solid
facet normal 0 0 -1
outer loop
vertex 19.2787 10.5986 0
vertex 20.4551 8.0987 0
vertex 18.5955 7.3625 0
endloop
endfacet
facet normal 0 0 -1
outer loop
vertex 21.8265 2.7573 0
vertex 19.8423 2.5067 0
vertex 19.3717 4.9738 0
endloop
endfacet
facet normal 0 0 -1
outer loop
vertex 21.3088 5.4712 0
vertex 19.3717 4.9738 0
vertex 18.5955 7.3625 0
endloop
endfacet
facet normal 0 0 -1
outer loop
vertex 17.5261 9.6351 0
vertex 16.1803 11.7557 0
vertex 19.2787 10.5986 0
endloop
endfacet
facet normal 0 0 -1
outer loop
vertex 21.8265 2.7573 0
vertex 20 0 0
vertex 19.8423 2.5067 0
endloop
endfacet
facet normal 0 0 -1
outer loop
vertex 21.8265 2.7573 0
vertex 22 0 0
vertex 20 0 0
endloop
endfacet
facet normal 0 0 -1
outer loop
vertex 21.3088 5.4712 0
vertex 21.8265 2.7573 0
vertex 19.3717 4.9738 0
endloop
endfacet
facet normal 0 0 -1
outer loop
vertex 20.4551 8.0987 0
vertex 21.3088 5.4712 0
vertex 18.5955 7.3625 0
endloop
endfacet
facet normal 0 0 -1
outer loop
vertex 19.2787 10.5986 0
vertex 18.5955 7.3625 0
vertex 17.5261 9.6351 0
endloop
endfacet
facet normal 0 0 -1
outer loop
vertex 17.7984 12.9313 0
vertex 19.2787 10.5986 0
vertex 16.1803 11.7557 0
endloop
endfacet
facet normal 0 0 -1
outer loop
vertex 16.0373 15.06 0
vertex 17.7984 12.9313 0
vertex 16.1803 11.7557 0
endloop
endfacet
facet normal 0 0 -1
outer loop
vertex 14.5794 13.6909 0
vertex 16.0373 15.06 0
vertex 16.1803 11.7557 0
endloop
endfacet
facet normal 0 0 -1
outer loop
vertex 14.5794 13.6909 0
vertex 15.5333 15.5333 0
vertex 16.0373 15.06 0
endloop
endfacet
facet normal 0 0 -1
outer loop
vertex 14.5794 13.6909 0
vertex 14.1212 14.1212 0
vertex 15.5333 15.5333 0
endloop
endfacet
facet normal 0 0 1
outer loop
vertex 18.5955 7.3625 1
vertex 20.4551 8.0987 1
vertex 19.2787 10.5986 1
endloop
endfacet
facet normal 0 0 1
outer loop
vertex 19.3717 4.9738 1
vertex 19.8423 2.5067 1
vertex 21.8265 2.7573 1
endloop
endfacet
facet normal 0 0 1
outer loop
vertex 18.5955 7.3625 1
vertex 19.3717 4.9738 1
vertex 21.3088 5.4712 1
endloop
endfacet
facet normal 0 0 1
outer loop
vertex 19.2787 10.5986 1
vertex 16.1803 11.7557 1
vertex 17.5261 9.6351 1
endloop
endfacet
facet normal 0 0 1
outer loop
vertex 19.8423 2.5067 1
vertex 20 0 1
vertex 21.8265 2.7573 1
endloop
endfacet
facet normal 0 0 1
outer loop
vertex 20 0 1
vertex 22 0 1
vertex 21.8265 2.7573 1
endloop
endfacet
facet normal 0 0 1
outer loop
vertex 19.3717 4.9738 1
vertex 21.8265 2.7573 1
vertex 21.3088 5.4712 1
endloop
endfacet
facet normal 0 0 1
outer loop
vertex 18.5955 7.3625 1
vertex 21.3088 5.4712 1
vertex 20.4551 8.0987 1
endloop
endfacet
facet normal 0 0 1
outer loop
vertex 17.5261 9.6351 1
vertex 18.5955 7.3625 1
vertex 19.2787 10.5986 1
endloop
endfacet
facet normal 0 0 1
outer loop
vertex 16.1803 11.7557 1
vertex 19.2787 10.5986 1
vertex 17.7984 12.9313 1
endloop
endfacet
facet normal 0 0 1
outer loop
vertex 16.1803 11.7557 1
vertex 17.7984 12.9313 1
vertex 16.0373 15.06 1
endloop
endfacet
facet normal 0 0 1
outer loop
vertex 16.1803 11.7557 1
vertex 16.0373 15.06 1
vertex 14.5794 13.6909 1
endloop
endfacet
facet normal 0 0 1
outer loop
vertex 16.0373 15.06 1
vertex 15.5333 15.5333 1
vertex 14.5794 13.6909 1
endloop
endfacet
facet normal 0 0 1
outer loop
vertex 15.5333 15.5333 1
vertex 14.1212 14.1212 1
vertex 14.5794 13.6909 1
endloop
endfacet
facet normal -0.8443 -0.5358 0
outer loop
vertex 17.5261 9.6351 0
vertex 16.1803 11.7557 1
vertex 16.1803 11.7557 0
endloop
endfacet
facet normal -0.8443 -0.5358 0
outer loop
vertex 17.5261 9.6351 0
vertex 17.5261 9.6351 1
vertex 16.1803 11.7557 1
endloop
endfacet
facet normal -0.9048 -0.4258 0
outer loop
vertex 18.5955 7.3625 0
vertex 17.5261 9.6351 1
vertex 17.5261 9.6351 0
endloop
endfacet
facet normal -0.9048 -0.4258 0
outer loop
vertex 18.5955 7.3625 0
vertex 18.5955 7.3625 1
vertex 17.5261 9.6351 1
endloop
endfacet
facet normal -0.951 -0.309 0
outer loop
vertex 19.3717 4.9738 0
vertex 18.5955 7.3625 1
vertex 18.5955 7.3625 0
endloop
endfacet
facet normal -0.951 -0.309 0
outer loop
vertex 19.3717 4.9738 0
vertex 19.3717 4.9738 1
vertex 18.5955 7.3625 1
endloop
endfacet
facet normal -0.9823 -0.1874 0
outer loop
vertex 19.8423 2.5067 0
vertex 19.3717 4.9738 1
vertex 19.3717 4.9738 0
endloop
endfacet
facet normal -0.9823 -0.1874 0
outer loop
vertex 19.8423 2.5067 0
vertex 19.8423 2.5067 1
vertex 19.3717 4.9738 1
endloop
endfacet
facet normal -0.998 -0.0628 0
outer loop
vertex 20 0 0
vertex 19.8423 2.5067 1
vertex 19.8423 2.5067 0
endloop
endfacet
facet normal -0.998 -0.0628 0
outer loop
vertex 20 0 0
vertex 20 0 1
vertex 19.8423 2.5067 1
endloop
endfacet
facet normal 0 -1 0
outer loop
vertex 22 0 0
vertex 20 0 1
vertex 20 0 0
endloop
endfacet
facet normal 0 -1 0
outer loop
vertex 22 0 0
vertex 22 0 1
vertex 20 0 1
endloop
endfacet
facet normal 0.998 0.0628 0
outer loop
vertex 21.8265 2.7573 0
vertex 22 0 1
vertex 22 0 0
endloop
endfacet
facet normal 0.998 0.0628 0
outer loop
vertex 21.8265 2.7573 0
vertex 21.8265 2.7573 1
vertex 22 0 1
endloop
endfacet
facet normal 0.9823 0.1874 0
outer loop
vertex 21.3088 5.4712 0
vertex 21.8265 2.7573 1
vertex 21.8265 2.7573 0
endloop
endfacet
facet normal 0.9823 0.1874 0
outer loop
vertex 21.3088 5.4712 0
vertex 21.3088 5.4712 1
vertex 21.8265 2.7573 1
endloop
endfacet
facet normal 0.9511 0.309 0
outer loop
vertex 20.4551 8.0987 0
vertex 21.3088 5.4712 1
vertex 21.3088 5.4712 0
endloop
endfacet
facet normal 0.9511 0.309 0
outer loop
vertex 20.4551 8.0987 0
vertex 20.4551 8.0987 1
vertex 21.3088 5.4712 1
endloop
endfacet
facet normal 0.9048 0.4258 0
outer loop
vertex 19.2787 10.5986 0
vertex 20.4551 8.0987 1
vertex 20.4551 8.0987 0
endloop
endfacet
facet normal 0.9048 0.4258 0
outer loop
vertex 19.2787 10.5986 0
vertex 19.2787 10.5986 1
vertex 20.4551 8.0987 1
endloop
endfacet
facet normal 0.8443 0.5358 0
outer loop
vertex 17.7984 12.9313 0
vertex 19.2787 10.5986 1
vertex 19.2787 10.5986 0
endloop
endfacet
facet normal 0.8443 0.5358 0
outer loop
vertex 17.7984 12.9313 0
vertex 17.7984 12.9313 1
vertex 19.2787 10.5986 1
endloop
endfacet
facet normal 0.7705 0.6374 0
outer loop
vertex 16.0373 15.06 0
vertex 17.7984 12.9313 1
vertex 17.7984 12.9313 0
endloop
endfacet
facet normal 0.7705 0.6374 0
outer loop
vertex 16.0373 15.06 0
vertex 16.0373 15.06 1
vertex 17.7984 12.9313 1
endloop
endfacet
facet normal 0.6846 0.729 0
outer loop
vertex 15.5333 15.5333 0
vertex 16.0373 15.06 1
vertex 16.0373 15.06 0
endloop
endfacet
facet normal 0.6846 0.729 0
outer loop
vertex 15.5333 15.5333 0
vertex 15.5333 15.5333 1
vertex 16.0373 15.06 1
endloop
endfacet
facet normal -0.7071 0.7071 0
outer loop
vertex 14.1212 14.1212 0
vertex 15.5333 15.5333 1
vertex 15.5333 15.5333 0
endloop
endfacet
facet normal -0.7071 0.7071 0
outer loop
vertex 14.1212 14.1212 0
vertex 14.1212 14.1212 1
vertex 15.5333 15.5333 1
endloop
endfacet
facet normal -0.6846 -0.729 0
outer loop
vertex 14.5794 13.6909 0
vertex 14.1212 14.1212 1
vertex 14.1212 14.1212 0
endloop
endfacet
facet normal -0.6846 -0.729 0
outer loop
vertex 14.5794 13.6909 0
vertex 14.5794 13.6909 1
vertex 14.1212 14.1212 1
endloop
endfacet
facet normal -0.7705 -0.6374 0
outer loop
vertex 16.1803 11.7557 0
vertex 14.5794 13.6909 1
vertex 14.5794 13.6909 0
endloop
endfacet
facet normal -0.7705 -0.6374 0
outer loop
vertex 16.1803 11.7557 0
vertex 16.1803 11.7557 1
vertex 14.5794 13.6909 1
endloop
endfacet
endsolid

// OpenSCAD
// file: ../../vendor/honeycomb.scad
/**
 * Honeycomb library
 * License: Creative Commons - Attribution
 * Copyright: Gael Lafond 2017
 * URL: https://www.thingiverse.com/thing:2484395
 *
 * Inspired from:
 *   https://www.thingiverse.com/thing:1763704
 */

// a single filled hexagon
module hexagon(l)  {
	circle(d=l, $fn=6);
}

// parametric honeycomb  
module honeycomb(x, y, dia, wall)  {
	// Diagram
	//          ______     ___
	//         /     /\     |
	//        / dia /  \    | smallDia
	//       /     /    \  _|_
	//       \          /   ____ 
	//        \        /   / 
	//     ___ \______/   / 
	// wall |            /
	//     _|_  ______   \
	//         /      \   \
	//        /        \   \
	//                 |---|
	//                   projWall
	//
	smallDia = dia * cos(30);
	projWall = wall * cos(30);

	yStep = smallDia + wall;
	xStep = dia*3/2 + projWall*2;

	difference()  {
		square([x, y]);

		// Note, number of step+1 to ensure the whole surface is covered
		for (yOffset = [0:yStep:y+yStep], xOffset = [0:xStep:x+xStep]) {
			translate([xOffset, yOffset]) {
				hexagon(dia);
			}
			translate([xOffset + dia*3/4 + projWall, yOffset + (smallDia+wall)/2]) {
				hexagon(dia);
			}
		}
	}
}
// file: ../../lib/design/honeycomb.scad
include <../../vendor/honeycomb.scad>
include <../primitive/rounded_cube.scad>

$wall_thickness = 2;
$bleed = 0.01;
$hexagons_per_side = 2;

function relative_diameter(dimensions) = (
  min(
    dimensions[0],
    dimensions[1]) + $wall_thickness
  ) / $hexagons_per_side;

function honeycomb_inset_size(size, inset = $wall_thickness) = [
    size[0] - $wall_thickness,
    size[1] - inset * 2,
    size[2] + $bleed * 2,
];

module block_border(dimensions) {
  inner_dimensions = [
    dimensions[0] - $wall_thickness * 2,
    dimensions[1] - $wall_thickness * 2,
    dimensions[2] + $bleed * 2
  ];

  difference() {
    rounded_cube(dimensions, flat_top=true, flat_bottom=true);

    translate([$wall_thickness, $wall_thickness, -$bleed]) {
      rounded_cube(inner_dimensions, flat_top=true, flat_bottom=true);
    }
  }
}

module negative_honeycomb_cube(dimensions, diameter=-1) {
  honeycomb_size = [
    dimensions[0],
    dimensions[1],
    dimensions[2] + $bleed * 2,
  ];

  difference() {
    cube(dimensions);
    translate([0, 0, -$bleed]) {
      honeycomb_cube(dimensions, diameter);
    }
  }
}

module honeycomb_cube(dimensions, diameter=-1) {
  _diameter = diameter > 0
    ? diameter
    : relative_diameter(dimensions);

  linear_extrude(dimensions[2]) {
    honeycomb(dimensions[0], dimensions[1], _diameter, $wall_thickness);
  }
}

module honeycomb_spacer(dimensions) {
  honeycomb_cube(dimensions);

  block_border(dimensions);
}
// file: ../../lib/primitive/rounded_square.scad
$bleed = 1;
$rounding = 3;

module rounded_square(size, flat_top=false, flat_bottom=false) {
  assert(!(flat_top && flat_bottom), "Flat top and flat bottom are exclusive");

  rounding_height = flat_top || flat_bottom 
    ? $rounding 
    : $rounding * 2;

  offset = flat_bottom ? 0 : $rounding;

  inner_size = [
    size[0] - $rounding * 2,
    size[1] - rounding_height,
  ];

  minkowski() {
    translate([$rounding, offset]) {
      square(inner_size);
    }
    if (flat_top ) {
      difference() {
        circle($rounding);
        translate([-$rounding, 0]) {
          square([$rounding * 2, $rounding]);
        }
      }
    } else if (flat_bottom) {
      difference() {
        circle($rounding);
        translate([-$rounding, -$rounding]) {
          square([$rounding * 2, $rounding]);
        }
      }
    } else {
      circle($rounding);
    }
  }
}
// file: ../../lib/util/util_functions.scad
function sum(v) = [for(p = v) 1] * v;

function take_sum(v, i) = i == 0 
  ? 0 
  : sum([for(a=[0:i-1]) v[a]]);

// input : nested list
// output : list with the outer level nesting removed
function flatten(l) = [ for (a = l) for (b = a) b ] ;
// file: ../../lib/compound/notched_cube.scad
include <../layout/layout.scad>
include <../design/honeycomb.scad>

$wall_thickness = 2;
$bleed = 0.01;
$padding = 0.5;
$inset = 6;
$cutout_fraction = 0.6;
$cutout_lid_height = $wall_thickness;

// I have no idea why it needs to be this vaule
// Seems to be to do with how the cube handles rounding
magic_pill_number = 0.4;

// TODO review pill feature, it's been changed to include padding so
// the magic pill number might no longer be needed
function cutout_rounding (size, pill=false) = pill
  ? min(size[0], size[1]) / 2  + magic_pill_number:
  1;

function cutout_fraction_size(length) = length * $cutout_fraction;

function cutout_fraction_rect(rect) = [
  cutout_fraction_size(rect[0]),
  cutout_fraction_size(rect[1]),
];

module notched_cube(
  size,
  floor_height=$wall_thickness,
  left_cutout=false,
  right_cutout=false,
  top_cutout=false,
  bottom_cutout=false,
  honeycomb_diameter=undef,
  pill=false,
  floor_cutout=false,
  cutout_size=undef,
  bounding_box=undef,
) {
  _bounding_box = bounding_box == undef ? size : bounding_box;
  cutout_fraction = cutout_fraction_size(cutout_size == undef ? size : cutout_size);

  assert(size[2] > floor_height, "Box height shorter than floor height");
  assert(size[0] <= _bounding_box[0], "Bounding box must be greater than or equal to size");
  assert(size[1] <= _bounding_box[1], "Bounding box must be greater than or equal to size");

  honeycomb_base = honeycomb_diameter != undef;
  inset_length = $inset * 2 + $wall_thickness;
  box_offset = offset_centre_in_box(size, _bounding_box);

  cutout_size = [
    size[0],
    size[1],
    size[2] - floor_height + $bleed,
  ];

  translate(box_offset) {
    translate([0, 0, floor_height]) {
      rounded_cube(cutout_size, flat = true, $rounding = cutout_rounding(size, pill));
    }

    if (left_cutout) {
      left_cutout_size = [
        inset_length + box_offset[0],
        cutout_fraction[1],
        size[2] + $cutout_lid_height + $bleed * 2,
      ];

      translate([
        - left_cutout_size[0] + $inset,
        (size[1] - left_cutout_size[1]) / 2,
        0
      ]) {
        rounded_cube(left_cutout_size, flat = true);
      }
    }

    if (right_cutout) {
      right_cutout_size = [
        inset_length + box_offset[0],
        cutout_fraction[1],
        size[2] + $cutout_lid_height + $bleed * 2,
      ];

      translate([
        size[0] - $inset,
        (size[1] - right_cutout_size[1]) / 2,
        0
      ]) {
        rounded_cube(right_cutout_size, flat = true);
      }
    }

    if (top_cutout) {
      top_cutout_size = [
        cutout_fraction[0],
        inset_length + box_offset[1],
        size[2] + $cutout_lid_height + $bleed * 2,
      ];

      translate([
        (size[0] - top_cutout_size[0]) / 2,
        size[1] - $inset,
        0
      ]) {
        rounded_cube(top_cutout_size, flat = true);
      }
    }

    if (bottom_cutout) {
      bottom_cutout_size = [
        cutout_fraction[0],
        inset_length + box_offset[1],
        size[2] + $cutout_lid_height + $bleed * 2,
      ];

      translate([
        (size[0] - bottom_cutout_size[0]) / 2,
        - bottom_cutout_size[1] + $inset,
        0
      ]) {
        rounded_cube(bottom_cutout_size, flat = true);
      }
    }

    // clearences to help place things inside without hitting the other cutouts
    frame_thickness = honeycomb_base ? $wall_thickness : ($wall_thickness * 3);

    left_clearance = (left_cutout ? $inset : 0) + frame_thickness;
    right_clearance = (right_cutout ? $inset : 0) + frame_thickness;
    top_clearance = (top_cutout ? $inset : 0) + frame_thickness;
    bottom_clearance = (bottom_cutout ? $inset : 0) + frame_thickness;

    floor_cutout_size = [
      size[0] - left_clearance - right_clearance,
      size[1] - top_clearance - bottom_clearance,
      floor_height + $bleed * 2,
    ];

    if (honeycomb_base || floor_cutout) {
      translate([left_clearance, bottom_clearance, - $bleed]) {
        if (honeycomb_base) {
          negative_honeycomb_cube(floor_cutout_size, honeycomb_diameter);
        } else if (floor_cutout) {
          rounded_cube(floor_cutout_size, flat = true);
        }
      }
    }
  }
}
// file: ../../lib/layout/layout.scad
$padding = 0.5;
$wall_thickness = 2;
$padding_rect = [$padding * 2, $padding * 2];
$wall_rect = [$wall_thickness, $wall_thickness];

function stack_height (size, count=1) = size * count + $padding;

function padded_offset (length, index=1) = (length + $padding * 2 + $wall_thickness) * index;

function offset (size, index=1) = (size + $wall_thickness) * index;

function pad (size) = size + $padding * 2;

function divide_rect(rect, operand) = [rect[0] / operand, rect[1] / operand];
function multiply_rect(rect, operand) = [rect[0] * operand, rect[1] * operand];

function divide_cube(rect, operand) = [rect[0] / operand, rect[1] / operand, rec[2] / operand];
function multiply_cube(rect, operand) = [rect[0] * operand, rect[1] * operand, rect[2] * operand];

function offset_centre_in_box(size, bounding_box) = divide_rect(bounding_box - size, 2);

module offset_cylinder(d, h) {
  translate([d / 2, d / 2, 0]) {
    cylinder(d=d, h=h);
  }
}

module offset_circle(d) {
  translate([d / 2, d / 2, 0]) {
    circle(d=d);
  }
}

module offset_square(size, center=false) {
  translate([size[0] / 2, size[1] / 2, 0]) {
    square(size, center=center);
  }
}
// file: ../../lib/primitive/rounded_cube.scad
include <./rounded_square.scad>

$bleed = 1;
$rounding = 3;

// Render a rounded cube
// flat_top: do not round the top edges
// flat_bottom: do not round the bottom edges
// flat: equals flat_top && flat_bottom
// 
// Limitations:
// requires height > $rounding * 2
// flat_top || flat_bottom requires height > $rounding
// flat_top && flat_bottom requires height > $bleed
module rounded_cube(
  size, 
  flat=false, 
  flat_top=false, 
  flat_bottom=false,
  side_rounding=-1
) {
  _flat = flat || (flat_top && flat_bottom);
  _flat_top = flat_top || flat;
  _flat_bottom = flat_bottom || flat;
  _rounding = min($rounding, size[2] / 2);
  _side_rounding = side_rounding > -1 ? side_rounding: $rounding;

  assert(_side_rounding >= $rounding, "side rounding cannot be less than rounding");

  top_height = _flat_top ? 0: _rounding;
  bottom_height = _flat_bottom ? 0: _rounding;

  cube_size = [
    size[0] - _rounding * 2,
    size[1] - _rounding * 2,
    size[2] - (top_height + bottom_height)
  ];

  if (_flat_top && _flat_bottom) {
     linear_extrude(cube_size[2]) {
       rounded_square([size[0], size[1]]);
     }
   } else {
     minkowski() {
       translate([_rounding, _rounding, bottom_height]) {
         if (_side_rounding != _rounding) {
           linear_extrude(cube_size[2]) {
             rounded_square([cube_size[0], cube_size[1]], $rounding=_side_rounding);
           }
         } else {
           cube(cube_size);
         }
       }

       if (_flat_top) {
         difference() {
           sphere(_rounding);
           cylinder(_rounding, _rounding, _rounding);
         }
       } else if (_flat_bottom) {
         difference() {
           sphere(_rounding);
           translate ([0, 0, -_rounding]) {
             cylinder(_rounding, _rounding, _rounding);
           }
         }
       } else {
         sphere(_rounding);
       }
    }
  }
}
// main file
include <../../lib/primitive/rounded_cube.scad>
include <../../lib/layout/layout.scad>
include <../../lib/compound/notched_cube.scad>
include <../../lib/util/util_functions.scad>

// Config
$fn = 50;
// $fn = 10;

module arc_prism(width, height, angle, distance_to_angle) {
  /*
  polygon([
    [0, 0],
    [0, distance_to_angle],
    // [distance_to_angle, distance_to_angle],
    [distance_to_angle, 0],
  ]);
  */

  polygon([
    [0, distance_to_angle],
    [0, distance_to_angle + width],
    [distance_to_angle + width, 0],
    [distance_to_angle, 0],
  ]);
}

// copied from blog, I don't understand the fn stuff but it seems to be
// to avoid the smaller circle having corners stick out
module sector(radius, angle, fn = 24) {
    r = radius / cos(180 / fn);
    step = -360 / fn;

    points = concat([[0, 0]],
        [for(a = [0 : step : angle - 360]) 
            [r * cos(a), r * sin(a)]
        ],
        [[r * cos(angle), r * sin(angle)]]
    );

    difference() {
        circle(radius, $fn = fn);
        polygon(points);
    }
}

module arc(radius, angles, width = 1, fn = 24) {
    difference() {
        sector(radius + width, angles, fn);
        sector(radius, angles, fn);
    }
} 

radius = 20;
width = 2;
angle = 45;

linear_extrude(1) arc(radius, angle, width, $fn);

tile_thickness = 1.64;

box_size = [
  100,
  100,
  40,
];

// arc_prism(20, tile_thickness, 30, 50);

/*
difference() {
  rounded_cube(box_size, flat_top=true, $rounding=2);


}
*/
